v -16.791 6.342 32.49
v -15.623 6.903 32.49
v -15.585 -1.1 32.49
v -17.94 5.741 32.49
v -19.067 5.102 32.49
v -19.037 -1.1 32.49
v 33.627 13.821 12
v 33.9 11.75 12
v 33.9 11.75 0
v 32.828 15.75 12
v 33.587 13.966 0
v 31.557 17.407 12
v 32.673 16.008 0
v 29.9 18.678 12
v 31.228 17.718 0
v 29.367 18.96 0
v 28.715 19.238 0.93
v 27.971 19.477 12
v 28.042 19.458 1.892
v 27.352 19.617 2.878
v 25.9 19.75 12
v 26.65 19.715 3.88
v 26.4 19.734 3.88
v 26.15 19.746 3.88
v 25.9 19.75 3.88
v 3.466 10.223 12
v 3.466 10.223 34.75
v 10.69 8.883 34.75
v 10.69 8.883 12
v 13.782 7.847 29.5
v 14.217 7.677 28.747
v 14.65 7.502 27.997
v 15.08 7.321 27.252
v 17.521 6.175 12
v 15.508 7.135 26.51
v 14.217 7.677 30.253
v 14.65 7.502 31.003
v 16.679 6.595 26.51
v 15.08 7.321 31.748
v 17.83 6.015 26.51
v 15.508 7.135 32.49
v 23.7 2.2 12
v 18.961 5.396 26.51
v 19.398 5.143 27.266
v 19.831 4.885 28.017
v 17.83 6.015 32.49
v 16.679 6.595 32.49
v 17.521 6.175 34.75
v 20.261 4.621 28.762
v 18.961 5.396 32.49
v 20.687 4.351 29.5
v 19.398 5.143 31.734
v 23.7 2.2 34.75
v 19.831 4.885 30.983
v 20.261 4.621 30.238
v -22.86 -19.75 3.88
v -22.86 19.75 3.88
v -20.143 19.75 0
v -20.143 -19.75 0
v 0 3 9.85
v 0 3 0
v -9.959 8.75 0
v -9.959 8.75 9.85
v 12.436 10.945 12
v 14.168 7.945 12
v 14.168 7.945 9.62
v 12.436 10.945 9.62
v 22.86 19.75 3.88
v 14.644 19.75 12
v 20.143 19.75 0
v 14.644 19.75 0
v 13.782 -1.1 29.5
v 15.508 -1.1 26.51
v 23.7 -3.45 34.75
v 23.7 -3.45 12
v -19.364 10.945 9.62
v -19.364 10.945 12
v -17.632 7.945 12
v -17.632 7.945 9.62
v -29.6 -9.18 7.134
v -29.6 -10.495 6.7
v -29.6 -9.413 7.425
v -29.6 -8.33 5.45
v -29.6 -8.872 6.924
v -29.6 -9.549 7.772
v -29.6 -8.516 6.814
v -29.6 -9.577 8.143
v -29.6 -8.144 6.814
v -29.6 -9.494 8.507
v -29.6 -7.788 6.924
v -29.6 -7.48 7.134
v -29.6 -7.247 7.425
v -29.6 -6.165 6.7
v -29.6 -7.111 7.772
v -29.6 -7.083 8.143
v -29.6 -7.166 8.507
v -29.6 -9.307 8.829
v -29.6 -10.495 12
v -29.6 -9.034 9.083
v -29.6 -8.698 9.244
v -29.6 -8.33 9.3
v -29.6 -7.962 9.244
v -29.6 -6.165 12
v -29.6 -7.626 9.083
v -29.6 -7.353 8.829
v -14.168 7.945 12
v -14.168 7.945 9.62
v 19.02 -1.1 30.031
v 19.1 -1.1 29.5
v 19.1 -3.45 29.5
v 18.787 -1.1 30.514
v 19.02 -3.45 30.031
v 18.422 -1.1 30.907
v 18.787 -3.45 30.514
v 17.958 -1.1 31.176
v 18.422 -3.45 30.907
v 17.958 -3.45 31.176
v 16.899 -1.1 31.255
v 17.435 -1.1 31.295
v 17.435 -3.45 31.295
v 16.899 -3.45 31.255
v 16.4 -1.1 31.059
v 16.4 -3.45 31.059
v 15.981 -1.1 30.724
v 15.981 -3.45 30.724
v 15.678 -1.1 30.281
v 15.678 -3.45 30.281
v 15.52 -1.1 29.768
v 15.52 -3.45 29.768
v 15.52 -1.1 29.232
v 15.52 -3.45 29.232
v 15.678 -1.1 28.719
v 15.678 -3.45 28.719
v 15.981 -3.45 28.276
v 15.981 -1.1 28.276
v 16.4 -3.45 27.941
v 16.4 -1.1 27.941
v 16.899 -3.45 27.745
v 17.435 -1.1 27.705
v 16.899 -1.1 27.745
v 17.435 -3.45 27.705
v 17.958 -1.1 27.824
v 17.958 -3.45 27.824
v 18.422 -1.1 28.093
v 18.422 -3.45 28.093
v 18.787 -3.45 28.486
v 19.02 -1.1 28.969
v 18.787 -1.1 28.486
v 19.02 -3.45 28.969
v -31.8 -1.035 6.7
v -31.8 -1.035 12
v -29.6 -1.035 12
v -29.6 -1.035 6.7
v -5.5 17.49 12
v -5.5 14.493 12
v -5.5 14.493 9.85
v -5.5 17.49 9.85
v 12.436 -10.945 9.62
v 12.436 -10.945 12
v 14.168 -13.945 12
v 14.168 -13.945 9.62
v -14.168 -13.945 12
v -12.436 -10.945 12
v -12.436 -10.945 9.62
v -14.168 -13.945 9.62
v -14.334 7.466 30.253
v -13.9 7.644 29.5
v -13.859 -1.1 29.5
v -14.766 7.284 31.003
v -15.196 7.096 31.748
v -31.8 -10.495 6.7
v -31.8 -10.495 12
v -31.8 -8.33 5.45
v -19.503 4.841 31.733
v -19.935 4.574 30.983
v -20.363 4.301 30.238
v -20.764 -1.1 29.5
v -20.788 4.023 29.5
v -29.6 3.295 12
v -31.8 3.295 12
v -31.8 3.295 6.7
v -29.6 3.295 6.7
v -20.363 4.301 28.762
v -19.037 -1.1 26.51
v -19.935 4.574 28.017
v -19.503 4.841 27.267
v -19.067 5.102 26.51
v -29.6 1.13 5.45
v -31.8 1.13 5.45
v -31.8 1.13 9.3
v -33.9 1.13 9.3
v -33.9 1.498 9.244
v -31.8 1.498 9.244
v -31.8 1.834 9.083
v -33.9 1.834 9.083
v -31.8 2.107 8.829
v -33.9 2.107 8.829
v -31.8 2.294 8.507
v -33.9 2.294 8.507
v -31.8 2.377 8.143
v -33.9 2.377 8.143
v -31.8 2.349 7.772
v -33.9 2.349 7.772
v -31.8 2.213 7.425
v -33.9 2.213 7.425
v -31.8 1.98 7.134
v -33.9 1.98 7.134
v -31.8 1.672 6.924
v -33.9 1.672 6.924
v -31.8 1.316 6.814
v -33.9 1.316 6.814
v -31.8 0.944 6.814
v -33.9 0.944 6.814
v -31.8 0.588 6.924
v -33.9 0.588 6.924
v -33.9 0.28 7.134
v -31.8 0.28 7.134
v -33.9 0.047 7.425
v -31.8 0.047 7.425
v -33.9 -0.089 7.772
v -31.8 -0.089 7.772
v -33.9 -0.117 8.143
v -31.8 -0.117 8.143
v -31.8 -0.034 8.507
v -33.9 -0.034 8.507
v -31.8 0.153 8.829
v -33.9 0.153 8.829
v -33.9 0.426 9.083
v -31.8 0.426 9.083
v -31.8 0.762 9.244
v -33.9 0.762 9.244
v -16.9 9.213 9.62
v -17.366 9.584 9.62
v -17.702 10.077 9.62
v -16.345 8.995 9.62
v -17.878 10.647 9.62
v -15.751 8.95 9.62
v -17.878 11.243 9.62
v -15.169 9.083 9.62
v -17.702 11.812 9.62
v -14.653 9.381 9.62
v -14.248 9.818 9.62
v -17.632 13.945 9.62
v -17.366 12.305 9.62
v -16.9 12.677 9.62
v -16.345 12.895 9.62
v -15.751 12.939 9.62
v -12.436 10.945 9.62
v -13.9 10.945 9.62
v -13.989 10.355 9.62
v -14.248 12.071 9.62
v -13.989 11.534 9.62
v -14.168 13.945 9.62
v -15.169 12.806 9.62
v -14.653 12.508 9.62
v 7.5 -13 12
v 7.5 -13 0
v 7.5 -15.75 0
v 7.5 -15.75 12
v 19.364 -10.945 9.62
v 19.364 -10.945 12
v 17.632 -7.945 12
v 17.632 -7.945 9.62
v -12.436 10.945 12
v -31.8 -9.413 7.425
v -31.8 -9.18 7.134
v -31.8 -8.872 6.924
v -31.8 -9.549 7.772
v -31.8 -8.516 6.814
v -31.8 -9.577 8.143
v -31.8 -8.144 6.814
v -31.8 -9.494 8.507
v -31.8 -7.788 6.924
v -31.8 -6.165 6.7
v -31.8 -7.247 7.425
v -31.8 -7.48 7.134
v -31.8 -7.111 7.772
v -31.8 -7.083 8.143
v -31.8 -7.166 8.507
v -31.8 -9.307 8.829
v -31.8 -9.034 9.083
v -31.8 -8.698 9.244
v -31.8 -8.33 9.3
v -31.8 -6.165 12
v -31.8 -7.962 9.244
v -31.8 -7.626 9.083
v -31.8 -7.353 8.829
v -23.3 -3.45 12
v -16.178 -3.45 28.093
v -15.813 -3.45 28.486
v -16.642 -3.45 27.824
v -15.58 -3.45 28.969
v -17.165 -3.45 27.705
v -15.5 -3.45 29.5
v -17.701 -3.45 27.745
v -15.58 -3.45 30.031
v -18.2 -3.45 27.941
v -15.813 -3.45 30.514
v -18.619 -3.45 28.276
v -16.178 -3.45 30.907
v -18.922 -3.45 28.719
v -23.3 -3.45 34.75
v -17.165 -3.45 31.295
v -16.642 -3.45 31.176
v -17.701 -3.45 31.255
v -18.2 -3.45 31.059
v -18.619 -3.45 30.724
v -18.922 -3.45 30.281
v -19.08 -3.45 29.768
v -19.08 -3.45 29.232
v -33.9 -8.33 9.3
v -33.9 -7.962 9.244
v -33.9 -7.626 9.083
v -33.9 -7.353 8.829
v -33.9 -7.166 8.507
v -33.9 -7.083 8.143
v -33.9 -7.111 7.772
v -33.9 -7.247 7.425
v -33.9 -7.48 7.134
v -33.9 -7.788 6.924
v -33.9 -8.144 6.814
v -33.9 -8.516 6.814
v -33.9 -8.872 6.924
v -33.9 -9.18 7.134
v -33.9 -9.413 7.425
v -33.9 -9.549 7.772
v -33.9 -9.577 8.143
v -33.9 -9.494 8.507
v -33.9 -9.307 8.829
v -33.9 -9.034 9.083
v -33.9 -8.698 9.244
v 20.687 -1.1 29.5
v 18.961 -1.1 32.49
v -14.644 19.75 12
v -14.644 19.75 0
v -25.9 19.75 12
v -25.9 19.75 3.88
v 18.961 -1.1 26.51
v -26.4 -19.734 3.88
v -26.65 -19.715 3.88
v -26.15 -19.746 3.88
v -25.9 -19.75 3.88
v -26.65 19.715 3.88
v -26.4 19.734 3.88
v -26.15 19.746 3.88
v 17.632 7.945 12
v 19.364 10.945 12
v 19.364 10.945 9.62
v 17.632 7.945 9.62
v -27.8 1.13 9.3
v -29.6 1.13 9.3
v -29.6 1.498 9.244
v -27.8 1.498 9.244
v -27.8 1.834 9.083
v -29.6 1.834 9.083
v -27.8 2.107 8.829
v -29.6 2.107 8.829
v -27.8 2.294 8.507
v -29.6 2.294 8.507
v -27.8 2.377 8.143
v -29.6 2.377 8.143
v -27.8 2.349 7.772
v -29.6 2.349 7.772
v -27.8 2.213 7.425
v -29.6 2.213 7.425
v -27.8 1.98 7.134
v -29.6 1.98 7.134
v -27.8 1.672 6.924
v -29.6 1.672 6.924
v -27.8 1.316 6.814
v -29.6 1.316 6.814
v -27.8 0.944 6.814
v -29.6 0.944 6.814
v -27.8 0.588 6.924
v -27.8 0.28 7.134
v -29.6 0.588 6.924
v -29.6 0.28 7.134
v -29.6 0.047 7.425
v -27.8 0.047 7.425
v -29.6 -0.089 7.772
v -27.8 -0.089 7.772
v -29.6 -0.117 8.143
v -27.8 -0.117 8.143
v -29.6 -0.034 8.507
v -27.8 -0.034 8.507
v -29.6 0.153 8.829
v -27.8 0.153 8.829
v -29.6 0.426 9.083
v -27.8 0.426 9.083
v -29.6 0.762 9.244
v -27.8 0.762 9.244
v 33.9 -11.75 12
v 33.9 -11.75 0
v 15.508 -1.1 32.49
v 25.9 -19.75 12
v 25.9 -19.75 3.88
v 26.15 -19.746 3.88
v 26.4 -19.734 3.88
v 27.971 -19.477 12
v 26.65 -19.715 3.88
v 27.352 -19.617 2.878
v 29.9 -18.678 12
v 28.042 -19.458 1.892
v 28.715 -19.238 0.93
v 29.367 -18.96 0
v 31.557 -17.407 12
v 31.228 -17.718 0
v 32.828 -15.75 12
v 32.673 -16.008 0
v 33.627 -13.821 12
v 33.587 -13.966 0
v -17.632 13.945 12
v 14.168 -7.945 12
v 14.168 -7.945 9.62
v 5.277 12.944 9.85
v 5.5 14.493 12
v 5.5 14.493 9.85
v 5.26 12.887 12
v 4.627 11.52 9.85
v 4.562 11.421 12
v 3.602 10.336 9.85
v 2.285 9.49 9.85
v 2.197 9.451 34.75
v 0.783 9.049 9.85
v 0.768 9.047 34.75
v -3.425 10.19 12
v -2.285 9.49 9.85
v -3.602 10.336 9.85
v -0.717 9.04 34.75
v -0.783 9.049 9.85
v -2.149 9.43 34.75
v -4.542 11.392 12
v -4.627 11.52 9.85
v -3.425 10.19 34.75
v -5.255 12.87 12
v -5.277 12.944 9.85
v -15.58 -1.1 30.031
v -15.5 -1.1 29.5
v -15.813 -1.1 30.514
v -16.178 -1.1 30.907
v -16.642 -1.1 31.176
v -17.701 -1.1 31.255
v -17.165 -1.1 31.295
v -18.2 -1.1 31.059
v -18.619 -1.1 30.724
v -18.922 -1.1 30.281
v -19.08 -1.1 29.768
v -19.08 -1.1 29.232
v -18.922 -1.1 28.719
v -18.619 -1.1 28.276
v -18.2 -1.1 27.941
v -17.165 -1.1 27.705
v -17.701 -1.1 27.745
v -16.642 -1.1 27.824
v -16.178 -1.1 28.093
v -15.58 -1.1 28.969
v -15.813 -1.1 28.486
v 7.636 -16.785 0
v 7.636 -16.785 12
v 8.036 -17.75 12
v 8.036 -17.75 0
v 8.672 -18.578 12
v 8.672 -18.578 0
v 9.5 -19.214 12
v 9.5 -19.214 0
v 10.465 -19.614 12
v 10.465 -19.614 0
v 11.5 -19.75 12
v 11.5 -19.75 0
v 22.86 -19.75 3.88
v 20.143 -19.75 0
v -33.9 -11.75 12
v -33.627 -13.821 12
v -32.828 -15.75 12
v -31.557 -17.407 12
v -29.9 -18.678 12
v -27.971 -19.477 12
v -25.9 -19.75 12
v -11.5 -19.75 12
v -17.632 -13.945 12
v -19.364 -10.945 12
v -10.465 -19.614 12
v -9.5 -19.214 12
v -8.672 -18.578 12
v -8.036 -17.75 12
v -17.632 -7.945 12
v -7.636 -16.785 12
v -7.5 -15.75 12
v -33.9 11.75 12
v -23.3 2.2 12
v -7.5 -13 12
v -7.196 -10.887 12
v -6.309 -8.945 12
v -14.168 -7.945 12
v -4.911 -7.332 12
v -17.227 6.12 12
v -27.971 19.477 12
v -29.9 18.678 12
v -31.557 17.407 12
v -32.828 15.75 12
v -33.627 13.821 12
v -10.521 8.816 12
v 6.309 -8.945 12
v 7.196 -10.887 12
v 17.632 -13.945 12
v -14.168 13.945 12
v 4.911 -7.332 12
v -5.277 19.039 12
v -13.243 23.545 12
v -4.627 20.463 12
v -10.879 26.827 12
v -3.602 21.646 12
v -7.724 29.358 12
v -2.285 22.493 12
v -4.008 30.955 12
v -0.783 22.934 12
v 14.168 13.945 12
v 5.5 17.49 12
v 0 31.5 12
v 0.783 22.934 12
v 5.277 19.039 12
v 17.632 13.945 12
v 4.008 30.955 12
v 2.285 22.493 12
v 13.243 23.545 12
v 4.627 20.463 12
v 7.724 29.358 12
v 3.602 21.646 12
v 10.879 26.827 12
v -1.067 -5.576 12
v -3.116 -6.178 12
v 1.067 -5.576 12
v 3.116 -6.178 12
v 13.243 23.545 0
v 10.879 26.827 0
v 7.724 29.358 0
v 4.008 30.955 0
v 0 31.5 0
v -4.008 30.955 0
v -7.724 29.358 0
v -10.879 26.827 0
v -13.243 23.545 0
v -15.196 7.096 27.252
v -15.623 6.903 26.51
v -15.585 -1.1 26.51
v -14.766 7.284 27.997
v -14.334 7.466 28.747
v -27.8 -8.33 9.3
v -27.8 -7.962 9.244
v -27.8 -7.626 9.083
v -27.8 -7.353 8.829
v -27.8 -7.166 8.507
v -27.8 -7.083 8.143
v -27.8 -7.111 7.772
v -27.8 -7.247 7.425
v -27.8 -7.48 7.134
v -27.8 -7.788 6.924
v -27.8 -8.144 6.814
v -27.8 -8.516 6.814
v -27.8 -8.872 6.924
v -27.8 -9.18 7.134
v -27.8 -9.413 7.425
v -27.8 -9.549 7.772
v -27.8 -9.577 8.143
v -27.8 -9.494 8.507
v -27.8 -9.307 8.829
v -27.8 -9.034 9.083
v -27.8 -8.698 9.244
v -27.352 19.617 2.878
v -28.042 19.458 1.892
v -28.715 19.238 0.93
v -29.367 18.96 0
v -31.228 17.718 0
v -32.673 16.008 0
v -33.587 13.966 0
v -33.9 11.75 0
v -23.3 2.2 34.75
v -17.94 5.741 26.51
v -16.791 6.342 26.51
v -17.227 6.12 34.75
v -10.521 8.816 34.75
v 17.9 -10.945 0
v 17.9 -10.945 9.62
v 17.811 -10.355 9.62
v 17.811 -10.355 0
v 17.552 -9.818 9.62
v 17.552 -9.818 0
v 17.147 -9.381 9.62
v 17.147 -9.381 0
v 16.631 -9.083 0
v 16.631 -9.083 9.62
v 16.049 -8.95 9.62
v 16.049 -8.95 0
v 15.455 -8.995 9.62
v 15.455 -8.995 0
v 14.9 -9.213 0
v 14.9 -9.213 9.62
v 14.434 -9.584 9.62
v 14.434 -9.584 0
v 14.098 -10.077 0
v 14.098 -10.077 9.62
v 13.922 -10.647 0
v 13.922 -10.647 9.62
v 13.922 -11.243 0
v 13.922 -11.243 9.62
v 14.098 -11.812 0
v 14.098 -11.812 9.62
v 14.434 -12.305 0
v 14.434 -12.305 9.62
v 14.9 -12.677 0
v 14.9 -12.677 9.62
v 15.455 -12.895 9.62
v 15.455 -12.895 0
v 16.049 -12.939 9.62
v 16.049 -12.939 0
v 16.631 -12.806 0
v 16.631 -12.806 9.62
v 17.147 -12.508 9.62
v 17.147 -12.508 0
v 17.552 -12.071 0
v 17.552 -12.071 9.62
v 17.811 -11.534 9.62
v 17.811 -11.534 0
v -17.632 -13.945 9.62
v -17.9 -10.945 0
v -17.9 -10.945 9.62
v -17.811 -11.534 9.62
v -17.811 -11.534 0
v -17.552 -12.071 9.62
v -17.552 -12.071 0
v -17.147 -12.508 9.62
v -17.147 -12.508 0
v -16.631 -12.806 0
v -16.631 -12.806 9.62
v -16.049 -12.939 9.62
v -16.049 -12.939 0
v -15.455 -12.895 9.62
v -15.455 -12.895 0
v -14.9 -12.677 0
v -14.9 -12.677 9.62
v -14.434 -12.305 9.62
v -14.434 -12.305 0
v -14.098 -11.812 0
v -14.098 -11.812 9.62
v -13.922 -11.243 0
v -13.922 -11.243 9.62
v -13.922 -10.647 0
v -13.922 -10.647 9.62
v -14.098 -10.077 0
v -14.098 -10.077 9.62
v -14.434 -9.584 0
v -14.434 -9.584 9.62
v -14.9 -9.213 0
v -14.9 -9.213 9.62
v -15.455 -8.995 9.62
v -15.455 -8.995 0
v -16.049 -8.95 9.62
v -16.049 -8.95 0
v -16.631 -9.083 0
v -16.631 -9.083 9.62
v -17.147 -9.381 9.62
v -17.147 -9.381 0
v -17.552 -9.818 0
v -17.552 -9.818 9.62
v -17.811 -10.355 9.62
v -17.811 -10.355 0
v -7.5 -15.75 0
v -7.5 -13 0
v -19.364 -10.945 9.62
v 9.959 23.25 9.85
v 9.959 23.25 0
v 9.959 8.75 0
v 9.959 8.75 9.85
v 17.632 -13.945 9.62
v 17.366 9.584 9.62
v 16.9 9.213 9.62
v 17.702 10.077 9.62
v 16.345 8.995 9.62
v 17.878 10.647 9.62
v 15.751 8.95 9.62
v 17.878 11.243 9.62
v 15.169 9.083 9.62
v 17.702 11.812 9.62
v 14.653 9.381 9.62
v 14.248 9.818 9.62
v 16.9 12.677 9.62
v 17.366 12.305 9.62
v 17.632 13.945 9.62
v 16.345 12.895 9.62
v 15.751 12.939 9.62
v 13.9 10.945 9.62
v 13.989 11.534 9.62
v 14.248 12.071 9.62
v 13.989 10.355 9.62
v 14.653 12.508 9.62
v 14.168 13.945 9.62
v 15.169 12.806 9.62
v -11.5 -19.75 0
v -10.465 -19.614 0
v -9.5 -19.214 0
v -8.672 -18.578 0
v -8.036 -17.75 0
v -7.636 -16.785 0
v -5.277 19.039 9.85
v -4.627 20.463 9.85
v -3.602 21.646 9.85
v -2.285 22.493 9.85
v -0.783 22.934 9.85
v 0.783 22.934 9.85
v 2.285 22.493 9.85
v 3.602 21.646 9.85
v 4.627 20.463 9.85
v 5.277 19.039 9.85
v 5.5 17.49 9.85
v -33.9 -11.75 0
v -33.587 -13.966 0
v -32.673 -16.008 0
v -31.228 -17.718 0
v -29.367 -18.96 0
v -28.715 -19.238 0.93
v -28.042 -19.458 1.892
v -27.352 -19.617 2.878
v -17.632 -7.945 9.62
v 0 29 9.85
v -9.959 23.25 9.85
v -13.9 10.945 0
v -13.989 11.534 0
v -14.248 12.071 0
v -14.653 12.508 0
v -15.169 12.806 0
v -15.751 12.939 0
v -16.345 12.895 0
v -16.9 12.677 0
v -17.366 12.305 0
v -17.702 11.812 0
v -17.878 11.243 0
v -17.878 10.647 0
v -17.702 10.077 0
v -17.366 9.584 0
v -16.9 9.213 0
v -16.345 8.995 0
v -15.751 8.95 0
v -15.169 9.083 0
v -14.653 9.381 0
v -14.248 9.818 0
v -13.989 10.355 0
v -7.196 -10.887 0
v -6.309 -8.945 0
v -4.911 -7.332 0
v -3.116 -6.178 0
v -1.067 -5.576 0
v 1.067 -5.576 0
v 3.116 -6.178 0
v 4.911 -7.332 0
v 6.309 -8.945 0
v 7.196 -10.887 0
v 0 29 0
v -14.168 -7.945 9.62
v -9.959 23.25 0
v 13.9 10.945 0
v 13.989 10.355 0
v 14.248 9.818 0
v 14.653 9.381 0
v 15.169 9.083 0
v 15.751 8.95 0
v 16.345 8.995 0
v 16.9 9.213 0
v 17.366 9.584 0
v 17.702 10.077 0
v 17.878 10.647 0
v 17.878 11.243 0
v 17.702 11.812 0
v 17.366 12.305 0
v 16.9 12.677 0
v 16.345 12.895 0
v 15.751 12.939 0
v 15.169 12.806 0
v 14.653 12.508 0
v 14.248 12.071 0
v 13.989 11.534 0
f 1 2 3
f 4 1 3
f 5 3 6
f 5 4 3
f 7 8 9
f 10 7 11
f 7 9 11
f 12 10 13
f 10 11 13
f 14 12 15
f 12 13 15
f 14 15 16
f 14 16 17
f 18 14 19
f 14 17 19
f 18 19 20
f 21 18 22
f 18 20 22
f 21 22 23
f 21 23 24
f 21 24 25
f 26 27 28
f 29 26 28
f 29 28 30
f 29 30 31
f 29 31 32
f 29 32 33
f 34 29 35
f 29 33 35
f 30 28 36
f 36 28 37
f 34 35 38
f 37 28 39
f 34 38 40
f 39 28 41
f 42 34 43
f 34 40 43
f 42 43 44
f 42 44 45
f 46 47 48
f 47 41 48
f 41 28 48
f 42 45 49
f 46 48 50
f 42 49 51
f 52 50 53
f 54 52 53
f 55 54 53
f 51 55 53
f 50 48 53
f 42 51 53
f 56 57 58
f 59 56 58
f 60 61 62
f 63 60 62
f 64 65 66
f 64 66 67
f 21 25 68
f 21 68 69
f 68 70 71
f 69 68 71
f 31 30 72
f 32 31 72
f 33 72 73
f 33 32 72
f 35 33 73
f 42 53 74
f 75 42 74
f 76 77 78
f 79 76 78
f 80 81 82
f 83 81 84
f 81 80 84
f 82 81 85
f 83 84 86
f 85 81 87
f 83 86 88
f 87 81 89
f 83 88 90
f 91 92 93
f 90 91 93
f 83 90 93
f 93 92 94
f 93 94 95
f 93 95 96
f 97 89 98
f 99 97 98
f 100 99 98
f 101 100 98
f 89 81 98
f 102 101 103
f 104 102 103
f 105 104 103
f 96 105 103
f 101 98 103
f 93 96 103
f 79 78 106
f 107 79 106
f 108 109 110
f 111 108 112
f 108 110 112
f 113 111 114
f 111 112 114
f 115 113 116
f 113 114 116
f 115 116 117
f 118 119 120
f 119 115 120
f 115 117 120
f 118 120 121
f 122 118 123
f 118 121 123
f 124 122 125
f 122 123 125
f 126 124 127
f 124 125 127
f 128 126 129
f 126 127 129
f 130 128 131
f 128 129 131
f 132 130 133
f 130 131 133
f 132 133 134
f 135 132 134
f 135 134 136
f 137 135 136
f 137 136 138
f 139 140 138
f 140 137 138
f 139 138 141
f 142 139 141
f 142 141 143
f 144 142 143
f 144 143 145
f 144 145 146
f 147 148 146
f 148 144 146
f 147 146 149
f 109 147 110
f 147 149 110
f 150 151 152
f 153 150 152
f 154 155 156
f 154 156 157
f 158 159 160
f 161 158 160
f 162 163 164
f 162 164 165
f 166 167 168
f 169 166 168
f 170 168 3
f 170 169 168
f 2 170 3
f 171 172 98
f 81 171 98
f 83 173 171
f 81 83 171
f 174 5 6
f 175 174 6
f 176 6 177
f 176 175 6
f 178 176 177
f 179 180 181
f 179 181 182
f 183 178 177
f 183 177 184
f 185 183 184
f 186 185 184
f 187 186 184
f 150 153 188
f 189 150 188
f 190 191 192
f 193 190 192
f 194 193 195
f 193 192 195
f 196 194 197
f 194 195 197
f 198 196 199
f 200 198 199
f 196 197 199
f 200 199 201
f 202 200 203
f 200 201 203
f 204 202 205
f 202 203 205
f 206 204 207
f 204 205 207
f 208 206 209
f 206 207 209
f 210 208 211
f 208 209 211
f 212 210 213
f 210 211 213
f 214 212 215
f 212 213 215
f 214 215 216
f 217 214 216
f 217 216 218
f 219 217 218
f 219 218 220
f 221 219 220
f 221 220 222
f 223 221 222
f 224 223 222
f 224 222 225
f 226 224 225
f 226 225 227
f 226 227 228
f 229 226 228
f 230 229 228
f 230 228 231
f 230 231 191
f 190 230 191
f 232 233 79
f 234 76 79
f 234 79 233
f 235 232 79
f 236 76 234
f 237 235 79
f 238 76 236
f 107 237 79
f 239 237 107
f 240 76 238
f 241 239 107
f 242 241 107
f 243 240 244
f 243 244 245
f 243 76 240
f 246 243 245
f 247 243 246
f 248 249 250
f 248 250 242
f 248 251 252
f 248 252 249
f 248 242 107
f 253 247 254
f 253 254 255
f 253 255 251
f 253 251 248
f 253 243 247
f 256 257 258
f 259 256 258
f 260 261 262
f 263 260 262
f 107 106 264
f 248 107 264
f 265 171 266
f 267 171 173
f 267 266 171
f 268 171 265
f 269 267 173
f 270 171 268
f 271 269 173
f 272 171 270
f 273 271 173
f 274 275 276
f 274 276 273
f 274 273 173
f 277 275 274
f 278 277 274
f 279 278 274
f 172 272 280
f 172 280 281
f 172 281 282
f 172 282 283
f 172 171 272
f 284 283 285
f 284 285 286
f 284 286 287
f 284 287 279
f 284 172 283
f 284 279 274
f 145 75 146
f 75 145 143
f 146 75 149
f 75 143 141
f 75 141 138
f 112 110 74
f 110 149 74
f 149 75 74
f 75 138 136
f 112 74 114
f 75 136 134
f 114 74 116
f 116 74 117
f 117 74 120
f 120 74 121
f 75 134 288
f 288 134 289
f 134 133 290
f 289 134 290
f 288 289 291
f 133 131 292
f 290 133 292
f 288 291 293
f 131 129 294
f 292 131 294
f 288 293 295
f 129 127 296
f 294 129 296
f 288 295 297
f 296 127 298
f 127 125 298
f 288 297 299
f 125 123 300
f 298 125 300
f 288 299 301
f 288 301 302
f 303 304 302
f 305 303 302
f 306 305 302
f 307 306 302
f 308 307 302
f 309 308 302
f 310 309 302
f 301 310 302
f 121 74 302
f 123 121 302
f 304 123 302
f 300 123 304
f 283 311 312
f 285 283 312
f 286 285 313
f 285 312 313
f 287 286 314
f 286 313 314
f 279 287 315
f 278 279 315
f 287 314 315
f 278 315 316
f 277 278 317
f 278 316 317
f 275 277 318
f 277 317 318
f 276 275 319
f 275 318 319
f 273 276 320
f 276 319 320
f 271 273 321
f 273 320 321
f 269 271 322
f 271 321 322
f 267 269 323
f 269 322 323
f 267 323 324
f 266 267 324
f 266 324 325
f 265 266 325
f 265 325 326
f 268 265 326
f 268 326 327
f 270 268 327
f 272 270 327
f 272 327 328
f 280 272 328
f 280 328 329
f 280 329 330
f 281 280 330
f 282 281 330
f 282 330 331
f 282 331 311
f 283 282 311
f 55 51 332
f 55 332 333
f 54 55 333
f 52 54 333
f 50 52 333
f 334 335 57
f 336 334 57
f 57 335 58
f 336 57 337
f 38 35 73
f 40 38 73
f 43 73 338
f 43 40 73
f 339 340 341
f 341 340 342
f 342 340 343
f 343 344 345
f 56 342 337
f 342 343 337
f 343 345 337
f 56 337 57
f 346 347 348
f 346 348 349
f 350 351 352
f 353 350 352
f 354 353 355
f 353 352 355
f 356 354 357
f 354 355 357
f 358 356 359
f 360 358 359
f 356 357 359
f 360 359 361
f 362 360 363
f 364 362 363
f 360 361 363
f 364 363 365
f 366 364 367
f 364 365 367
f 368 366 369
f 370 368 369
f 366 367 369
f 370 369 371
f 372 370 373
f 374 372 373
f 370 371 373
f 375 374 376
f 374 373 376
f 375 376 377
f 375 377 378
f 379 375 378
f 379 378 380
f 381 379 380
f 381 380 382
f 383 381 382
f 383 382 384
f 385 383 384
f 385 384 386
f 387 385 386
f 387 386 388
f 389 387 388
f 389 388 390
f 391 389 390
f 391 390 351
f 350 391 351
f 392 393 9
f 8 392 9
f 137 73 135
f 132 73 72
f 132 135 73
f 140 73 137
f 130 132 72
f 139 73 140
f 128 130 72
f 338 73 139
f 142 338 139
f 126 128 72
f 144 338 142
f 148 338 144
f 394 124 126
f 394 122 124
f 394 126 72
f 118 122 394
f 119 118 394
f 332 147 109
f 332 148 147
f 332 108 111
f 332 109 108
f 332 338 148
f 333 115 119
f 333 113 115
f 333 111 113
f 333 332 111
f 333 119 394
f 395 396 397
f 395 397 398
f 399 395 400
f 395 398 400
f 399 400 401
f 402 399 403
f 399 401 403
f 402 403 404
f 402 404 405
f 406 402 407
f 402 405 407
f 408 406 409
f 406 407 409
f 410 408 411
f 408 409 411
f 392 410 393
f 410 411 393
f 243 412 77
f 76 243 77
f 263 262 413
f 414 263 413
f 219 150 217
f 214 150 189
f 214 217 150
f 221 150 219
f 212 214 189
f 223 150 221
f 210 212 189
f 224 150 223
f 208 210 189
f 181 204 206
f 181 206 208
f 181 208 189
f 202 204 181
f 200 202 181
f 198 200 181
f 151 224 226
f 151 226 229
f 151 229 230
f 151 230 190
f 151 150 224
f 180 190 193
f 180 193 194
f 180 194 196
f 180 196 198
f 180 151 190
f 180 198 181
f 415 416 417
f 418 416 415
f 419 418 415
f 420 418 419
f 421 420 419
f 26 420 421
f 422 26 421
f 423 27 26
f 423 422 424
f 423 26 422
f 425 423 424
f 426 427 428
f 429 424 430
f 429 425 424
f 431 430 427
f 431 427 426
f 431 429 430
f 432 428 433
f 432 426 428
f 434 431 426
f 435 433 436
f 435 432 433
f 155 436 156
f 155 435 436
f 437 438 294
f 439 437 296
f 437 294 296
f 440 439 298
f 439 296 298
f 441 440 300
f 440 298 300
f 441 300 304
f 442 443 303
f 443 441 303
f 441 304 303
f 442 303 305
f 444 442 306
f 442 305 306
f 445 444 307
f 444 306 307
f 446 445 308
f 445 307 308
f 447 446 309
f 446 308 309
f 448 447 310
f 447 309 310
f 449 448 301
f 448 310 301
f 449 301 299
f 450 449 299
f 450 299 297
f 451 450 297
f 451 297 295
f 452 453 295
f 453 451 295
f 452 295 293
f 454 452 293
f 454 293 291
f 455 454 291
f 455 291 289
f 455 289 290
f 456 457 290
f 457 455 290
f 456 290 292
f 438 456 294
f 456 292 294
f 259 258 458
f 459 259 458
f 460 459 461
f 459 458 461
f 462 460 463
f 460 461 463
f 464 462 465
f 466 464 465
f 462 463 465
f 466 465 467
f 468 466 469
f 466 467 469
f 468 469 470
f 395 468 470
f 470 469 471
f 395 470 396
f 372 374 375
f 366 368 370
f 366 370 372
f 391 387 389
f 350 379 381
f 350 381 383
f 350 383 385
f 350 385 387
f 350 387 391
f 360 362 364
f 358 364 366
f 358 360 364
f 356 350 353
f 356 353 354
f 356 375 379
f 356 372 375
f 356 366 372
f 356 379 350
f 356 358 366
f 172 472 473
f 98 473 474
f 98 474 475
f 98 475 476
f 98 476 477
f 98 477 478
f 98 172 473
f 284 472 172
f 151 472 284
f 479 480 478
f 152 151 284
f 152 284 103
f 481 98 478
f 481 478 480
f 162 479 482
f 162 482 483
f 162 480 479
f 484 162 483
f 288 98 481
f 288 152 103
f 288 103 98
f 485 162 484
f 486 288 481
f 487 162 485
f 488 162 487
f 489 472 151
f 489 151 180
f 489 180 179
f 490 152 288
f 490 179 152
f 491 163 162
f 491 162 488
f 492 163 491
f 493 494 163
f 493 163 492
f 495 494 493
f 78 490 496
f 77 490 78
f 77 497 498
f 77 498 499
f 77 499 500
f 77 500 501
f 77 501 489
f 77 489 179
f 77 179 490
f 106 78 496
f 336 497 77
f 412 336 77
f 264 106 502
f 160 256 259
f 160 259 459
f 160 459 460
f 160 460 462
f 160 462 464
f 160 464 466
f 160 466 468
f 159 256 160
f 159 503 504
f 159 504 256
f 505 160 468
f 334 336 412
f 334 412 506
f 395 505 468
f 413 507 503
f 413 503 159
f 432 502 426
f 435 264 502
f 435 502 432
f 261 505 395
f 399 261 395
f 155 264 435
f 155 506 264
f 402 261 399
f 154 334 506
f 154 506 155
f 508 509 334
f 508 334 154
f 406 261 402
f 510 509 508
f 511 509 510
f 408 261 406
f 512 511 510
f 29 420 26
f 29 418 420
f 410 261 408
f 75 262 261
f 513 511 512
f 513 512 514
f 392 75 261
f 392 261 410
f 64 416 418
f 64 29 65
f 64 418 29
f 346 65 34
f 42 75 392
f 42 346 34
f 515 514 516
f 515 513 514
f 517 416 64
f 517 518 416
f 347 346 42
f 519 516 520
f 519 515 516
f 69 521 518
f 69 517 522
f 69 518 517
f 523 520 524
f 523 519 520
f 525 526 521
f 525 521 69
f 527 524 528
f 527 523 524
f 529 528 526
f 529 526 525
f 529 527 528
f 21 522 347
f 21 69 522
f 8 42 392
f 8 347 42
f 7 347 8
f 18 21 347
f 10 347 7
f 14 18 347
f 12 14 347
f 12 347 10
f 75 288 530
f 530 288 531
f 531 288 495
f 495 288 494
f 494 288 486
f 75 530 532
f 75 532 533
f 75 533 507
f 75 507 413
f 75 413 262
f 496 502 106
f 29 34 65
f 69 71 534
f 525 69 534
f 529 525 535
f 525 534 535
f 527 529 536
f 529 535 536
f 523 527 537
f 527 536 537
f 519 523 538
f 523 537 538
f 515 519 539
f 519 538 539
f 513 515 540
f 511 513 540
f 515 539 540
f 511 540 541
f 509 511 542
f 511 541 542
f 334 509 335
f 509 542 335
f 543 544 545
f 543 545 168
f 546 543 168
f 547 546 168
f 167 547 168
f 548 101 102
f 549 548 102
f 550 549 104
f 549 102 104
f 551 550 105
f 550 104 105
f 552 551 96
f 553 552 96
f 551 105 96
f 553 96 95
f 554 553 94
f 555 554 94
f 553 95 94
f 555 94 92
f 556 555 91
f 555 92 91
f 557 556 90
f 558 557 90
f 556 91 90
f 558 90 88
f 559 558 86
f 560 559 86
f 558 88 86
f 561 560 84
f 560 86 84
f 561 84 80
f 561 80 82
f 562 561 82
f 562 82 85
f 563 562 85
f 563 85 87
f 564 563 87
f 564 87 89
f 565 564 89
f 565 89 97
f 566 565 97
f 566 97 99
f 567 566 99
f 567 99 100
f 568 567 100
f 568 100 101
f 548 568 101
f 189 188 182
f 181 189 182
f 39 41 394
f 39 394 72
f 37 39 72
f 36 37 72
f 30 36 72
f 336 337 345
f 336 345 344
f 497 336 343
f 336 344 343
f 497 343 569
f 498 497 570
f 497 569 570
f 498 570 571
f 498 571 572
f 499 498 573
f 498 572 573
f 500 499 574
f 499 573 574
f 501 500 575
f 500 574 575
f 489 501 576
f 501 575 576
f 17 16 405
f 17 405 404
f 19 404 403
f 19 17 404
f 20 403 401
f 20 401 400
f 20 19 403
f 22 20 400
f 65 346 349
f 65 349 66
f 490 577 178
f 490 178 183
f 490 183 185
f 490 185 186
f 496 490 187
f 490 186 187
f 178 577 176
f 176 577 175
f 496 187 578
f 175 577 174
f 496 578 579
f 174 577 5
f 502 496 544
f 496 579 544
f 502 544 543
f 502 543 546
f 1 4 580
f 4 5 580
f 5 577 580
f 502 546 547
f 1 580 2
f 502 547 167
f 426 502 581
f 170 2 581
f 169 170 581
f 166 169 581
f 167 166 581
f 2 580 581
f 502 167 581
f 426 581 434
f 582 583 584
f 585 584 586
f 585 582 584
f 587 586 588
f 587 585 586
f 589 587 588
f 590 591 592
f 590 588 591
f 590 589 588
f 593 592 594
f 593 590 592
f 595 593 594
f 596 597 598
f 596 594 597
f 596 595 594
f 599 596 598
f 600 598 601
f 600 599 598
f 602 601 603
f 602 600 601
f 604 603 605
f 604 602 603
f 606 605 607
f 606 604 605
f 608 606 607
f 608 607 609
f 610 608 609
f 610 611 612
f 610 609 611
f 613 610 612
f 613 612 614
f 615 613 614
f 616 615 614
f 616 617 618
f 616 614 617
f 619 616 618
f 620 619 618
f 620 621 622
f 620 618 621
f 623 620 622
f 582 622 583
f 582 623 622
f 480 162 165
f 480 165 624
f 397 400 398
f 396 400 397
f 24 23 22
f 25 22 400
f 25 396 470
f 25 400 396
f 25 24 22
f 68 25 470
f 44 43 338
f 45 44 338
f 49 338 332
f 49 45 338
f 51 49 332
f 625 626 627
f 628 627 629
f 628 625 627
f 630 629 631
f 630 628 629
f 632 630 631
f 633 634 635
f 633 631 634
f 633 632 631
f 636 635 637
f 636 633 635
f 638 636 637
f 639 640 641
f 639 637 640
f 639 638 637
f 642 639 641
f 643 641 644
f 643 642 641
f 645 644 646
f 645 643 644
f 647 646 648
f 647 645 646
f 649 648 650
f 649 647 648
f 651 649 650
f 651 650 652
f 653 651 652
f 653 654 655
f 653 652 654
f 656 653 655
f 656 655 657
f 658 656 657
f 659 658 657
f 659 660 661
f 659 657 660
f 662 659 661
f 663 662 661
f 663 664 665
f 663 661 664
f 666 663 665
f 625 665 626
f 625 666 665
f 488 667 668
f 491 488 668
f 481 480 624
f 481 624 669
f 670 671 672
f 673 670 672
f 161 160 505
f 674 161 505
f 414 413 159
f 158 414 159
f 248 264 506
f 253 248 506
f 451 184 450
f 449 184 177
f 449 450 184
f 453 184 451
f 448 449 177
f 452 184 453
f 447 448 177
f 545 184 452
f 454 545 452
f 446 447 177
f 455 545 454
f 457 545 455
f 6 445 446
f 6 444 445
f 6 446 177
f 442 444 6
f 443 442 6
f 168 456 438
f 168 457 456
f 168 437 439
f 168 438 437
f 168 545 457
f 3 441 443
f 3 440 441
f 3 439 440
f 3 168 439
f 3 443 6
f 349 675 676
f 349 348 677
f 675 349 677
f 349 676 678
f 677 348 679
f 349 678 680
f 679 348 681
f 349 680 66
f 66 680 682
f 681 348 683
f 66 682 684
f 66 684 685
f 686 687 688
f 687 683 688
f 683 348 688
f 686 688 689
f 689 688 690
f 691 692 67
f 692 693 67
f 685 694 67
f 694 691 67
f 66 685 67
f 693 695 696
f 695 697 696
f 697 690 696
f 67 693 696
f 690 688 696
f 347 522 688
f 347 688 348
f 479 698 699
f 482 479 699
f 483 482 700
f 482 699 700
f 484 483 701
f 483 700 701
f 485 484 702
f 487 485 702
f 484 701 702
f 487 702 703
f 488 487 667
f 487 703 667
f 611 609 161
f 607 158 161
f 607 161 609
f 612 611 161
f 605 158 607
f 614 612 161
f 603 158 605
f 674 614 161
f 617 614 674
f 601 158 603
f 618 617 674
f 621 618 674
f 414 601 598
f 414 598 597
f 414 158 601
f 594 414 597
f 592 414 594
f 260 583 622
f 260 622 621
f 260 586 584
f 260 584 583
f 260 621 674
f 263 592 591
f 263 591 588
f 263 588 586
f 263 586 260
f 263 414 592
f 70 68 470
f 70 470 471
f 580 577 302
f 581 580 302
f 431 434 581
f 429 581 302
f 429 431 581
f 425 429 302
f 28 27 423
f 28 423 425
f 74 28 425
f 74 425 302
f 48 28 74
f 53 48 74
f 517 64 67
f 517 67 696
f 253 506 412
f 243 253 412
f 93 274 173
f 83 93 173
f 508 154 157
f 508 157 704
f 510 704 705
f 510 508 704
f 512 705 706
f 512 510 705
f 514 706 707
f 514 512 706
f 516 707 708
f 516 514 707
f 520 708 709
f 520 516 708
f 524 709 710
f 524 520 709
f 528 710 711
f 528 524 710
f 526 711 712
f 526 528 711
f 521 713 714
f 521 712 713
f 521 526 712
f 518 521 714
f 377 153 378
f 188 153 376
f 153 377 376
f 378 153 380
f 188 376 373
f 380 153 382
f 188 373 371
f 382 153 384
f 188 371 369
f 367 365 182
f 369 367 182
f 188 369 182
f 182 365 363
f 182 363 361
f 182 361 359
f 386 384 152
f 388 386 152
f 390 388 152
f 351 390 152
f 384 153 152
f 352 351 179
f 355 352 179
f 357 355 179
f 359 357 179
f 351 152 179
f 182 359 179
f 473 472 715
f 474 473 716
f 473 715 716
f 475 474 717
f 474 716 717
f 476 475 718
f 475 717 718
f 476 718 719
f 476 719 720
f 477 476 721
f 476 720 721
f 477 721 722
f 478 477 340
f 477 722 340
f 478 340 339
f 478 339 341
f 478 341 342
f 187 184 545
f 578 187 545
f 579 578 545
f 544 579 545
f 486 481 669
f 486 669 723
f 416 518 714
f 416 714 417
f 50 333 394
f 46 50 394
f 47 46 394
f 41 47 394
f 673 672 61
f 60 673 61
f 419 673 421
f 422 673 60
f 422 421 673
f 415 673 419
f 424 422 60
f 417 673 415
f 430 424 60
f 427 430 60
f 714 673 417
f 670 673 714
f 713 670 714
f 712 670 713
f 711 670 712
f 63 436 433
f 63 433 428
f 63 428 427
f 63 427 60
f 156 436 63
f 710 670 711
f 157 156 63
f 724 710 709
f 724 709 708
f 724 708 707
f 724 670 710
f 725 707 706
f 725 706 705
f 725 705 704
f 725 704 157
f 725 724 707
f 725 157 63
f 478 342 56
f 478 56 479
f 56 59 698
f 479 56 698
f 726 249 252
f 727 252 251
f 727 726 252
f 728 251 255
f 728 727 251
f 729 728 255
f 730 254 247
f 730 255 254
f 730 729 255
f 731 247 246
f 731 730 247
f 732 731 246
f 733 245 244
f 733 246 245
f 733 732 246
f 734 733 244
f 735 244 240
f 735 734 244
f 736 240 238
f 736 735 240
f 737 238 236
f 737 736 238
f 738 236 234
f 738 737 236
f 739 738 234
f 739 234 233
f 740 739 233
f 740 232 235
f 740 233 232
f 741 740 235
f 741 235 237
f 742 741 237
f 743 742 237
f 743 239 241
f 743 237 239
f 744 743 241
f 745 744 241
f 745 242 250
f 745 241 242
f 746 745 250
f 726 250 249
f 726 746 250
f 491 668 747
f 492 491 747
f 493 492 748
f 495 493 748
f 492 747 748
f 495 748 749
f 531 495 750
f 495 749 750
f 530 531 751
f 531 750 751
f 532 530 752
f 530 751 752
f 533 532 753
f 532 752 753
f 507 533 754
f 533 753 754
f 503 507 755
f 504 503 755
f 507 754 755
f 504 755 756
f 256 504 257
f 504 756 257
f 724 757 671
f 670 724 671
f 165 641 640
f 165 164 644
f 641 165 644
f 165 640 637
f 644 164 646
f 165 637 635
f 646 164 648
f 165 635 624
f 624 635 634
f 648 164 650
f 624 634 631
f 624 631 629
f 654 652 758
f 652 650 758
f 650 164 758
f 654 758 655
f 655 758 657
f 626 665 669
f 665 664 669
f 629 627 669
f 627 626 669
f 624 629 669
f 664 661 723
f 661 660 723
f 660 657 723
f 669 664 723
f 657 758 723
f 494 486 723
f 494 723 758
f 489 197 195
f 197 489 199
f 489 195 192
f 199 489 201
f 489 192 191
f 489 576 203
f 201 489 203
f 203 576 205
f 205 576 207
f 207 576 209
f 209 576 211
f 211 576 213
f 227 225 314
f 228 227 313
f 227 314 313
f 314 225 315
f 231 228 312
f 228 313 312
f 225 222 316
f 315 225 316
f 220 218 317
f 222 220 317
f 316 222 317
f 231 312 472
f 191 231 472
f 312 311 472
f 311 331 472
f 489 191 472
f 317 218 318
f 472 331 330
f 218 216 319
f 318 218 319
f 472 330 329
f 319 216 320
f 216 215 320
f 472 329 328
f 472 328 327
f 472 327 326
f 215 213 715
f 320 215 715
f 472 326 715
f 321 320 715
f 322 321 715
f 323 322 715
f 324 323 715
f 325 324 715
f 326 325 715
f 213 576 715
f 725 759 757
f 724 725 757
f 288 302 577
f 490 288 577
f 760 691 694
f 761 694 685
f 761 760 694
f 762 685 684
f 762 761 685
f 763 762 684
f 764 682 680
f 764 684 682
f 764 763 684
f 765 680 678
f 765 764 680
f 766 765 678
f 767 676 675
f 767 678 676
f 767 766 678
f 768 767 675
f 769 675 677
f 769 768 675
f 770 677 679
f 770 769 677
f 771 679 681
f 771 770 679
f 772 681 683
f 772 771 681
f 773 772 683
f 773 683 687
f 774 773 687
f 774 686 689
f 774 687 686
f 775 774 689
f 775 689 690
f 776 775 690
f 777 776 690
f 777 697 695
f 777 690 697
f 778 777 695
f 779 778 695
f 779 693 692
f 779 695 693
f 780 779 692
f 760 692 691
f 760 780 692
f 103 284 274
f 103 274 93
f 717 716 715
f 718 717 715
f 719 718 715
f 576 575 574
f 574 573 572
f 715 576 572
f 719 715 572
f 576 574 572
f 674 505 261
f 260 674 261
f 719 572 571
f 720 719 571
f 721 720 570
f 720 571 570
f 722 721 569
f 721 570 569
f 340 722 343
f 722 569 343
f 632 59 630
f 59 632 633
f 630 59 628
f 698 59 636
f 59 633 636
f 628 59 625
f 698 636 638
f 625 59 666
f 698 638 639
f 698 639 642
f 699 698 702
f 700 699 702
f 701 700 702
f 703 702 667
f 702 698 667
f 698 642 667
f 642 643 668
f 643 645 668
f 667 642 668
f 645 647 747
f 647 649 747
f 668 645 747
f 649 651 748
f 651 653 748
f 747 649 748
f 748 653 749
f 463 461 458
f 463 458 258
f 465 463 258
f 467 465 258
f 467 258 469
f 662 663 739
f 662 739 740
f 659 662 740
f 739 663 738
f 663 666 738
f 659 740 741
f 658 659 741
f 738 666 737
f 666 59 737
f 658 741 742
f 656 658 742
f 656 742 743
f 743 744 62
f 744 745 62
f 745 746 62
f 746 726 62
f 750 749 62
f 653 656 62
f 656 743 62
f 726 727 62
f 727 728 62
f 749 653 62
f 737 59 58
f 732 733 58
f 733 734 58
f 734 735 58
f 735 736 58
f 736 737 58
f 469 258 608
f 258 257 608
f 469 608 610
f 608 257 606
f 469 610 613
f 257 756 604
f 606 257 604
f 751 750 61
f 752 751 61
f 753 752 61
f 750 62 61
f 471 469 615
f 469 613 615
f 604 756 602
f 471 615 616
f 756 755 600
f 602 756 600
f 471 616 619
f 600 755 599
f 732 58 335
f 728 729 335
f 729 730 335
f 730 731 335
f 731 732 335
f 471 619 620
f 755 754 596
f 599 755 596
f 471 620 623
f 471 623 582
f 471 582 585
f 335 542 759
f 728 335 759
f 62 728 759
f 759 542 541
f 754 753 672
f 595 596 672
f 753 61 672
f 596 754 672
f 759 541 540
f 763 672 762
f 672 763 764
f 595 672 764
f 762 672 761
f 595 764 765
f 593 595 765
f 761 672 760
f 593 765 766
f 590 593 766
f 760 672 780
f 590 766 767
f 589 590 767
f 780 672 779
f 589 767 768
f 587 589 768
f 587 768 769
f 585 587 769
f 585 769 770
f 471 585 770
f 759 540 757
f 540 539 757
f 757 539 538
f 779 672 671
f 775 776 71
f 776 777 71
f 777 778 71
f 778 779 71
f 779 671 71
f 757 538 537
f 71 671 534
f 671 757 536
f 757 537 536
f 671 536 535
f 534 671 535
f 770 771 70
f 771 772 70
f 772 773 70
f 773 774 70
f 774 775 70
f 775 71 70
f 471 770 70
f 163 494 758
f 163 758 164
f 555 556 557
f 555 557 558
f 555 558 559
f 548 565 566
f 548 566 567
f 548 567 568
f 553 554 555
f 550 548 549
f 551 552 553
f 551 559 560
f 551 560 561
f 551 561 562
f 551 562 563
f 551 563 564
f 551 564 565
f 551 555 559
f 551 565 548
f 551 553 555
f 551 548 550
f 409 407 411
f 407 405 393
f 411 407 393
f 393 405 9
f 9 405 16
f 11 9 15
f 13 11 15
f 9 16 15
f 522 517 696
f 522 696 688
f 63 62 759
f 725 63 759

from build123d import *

# Parameters (mm, degrees)
SKETCH1_R               = 2
BOSS_EXTRUDE4_DEPTH     = 34.75
SKETCH5_R               = 2
CUT_EXTRUDE2_DEPTH      = 22.75
CUT_EXTRUDE3_REACH      = 59.871
CUT_EXTRUDE4_DEPTH      = 63.586120666
CUT_EXTRUDE5_REACH      = 61.819
CUT_EXTRUDE5_END_RADIUS = 37.906002519
SKETCH10_R              = 1.8
CUT_EXTRUDE6_REACH      = 59.074
SKETCH11_RX             = 1.8
SKETCH11_RY             = 1.799979565
CUT_EXTRUDE7_REACH      = 59.075
SKETCH11_4_RX           = 1.8
SKETCH11_4_RY           = 1.799979565
CUT_EXTRUDE8_DEPTH      = 9.85
SKETCH15_R              = 2
CUT_EXTRUDE9_DEPTH      = 2.38
SKETCH16_R              = 1.25
CUT_EXTRUDE10_DEPTH     = 6.1
SKETCH17_W              = 2.2
SKETCH17_H              = 4.33
CUT_EXTRUDE11_DEPTH     = 6.55
BOSS_EXTRUDE5_DEPTH     = 2.2
BOSS_EXTRUDE6_DEPTH     = 2.2


with BuildPart() as part:
    # Sketch1 → Boss-Extrude4 (new body)
    with BuildSketch(Plane.XY):
        with BuildLine():
            Line((-25.9, -19.75), (-11.5, -19.75))
            ThreePointArc((-11.5, -19.75), (-8.671572875, -18.578427125), (-7.5, -15.75))
            Line((-7.5, -15.75), (-7.5, -13))
            ThreePointArc((-7.5, -13), (0, -5.5), (7.5, -13))
            Line((7.5, -13), (7.5, -15.75))
            ThreePointArc((7.5, -15.75), (8.671572875, -18.578427125), (11.5, -19.75))
            Line((11.5, -19.75), (25.9, -19.75))
            ThreePointArc((25.9, -19.75), (31.556854249, -17.406854249), (33.9, -11.75))
            Line((33.9, -11.75), (33.9, 11.75))
            ThreePointArc((33.9, 11.75), (31.556854249, 17.406854249), (25.9, 19.75))
            Line((25.9, 19.75), (14.643684646, 19.75))
            ThreePointArc((14.643684646, 19.75), (0, 31.5), (-14.643684646, 19.75))
            Line((-14.643684646, 19.75), (-25.9, 19.75))
            ThreePointArc((-25.9, 19.75), (-31.556854249, 17.406854249), (-33.9, 11.75))
            Line((-33.9, 11.75), (-33.9, -11.75))
            ThreePointArc((-33.9, -11.75), (-31.556854249, -17.406854249), (-25.9, -19.75))
        make_face()
        with Locations((-15.9, 10.944699181)):
            Circle(SKETCH1_R, mode=Mode.SUBTRACT)
        with Locations(Location((-15.9, -10.944699181, 0), (0, 0, 180))):
            Circle(SKETCH1_R, mode=Mode.SUBTRACT)
        with Locations((15.9, -10.944699181)):
            Circle(SKETCH1_R, mode=Mode.SUBTRACT)
        with Locations(Location((15.9, 10.944699181, 0), (0, 0, 180))):
            Circle(SKETCH1_R, mode=Mode.SUBTRACT)
    extrude(amount=BOSS_EXTRUDE4_DEPTH)

    # Sketch5 → Cut-Extrude2 (cut)
    with BuildSketch(Plane.XY.offset(34.75)):
        with BuildLine():
            Line((33.9, -11.75), (33.9, 11.75))
            ThreePointArc((33.9, 11.75), (31.556854249, 17.406854249), (25.9, 19.75))
            Line((25.9, 19.75), (14.643684646, 19.75))
            ThreePointArc((14.643684646, 19.75), (0, 31.5), (-14.643684646, 19.75))
            Line((-14.643684646, 19.75), (-25.9, 19.75))
            ThreePointArc((-25.9, 19.75), (-31.556854249, 17.406854249), (-33.9, 11.75))
            Line((-33.9, 11.75), (-33.9, -11.75))
            ThreePointArc((-33.9, -11.75), (-31.556854249, -17.406854249), (-25.9, -19.75))
            Line((-25.9, -19.75), (-11.5, -19.75))
            ThreePointArc((-11.5, -19.75), (-8.671572875, -18.578427125), (-7.5, -15.75))
            Line((-7.5, -15.75), (-7.5, -13))
            ThreePointArc((-7.5, -13), (0, -5.5), (7.5, -13))
            Line((7.5, -13), (7.5, -15.75))
            ThreePointArc((7.5, -15.75), (8.671572875, -18.578427125), (11.5, -19.75))
            Line((11.5, -19.75), (25.9, -19.75))
            ThreePointArc((25.9, -19.75), (31.556854249, -17.406854249), (33.9, -11.75))
        make_face()
        with Locations((-15.9, 10.944699181)):
            Circle(SKETCH5_R, mode=Mode.SUBTRACT)
        with BuildLine():
            Line((-23.3, -3.45), (-23.3, 2.199999619))
            ThreePointArc((-23.3, 2.199999619), (0.199916465, 10.363760615), (23.699998093, 2.200475068))
            Line((23.699998093, 2.200475068), (23.699998093, -3.45))
            Line((23.699998093, -3.45), (-23.3, -3.45))
        make_face(mode=Mode.SUBTRACT)
    extrude(amount=-CUT_EXTRUDE2_DEPTH, mode=Mode.SUBTRACT)

    # Sketch6 → Cut-Extrude3 (cut, up to next)
    with BuildSketch(Plane.XY.offset(34.75), mode=Mode.PRIVATE) as cut_extrude3_sk1:
        with BuildLine():
            Line((-5.499999046, 14.493093188), (-5.499999046, 17.489830849))
            ThreePointArc((-5.499999046, 17.489830849), (0, 22.989829895), (5.499999046, 17.489830849))
            Line((5.499999046, 17.489830849), (5.499999046, 14.493093188))
            ThreePointArc((5.499999046, 14.493093188), (0, 8.993094142), (-5.499999046, 14.493093188))
        make_face()
    cut_extrude3_tool1 = extrude(cut_extrude3_sk1.sketch, amount=-CUT_EXTRUDE3_REACH, mode=Mode.PRIVATE) & part.part
    add(cut_extrude3_tool1.solids().sort_by_distance((0, 15.991462, 34.75))[0], mode=Mode.SUBTRACT)

    # Sketch9 → Cut-Extrude4 (cut, through all)
    with BuildSketch(Plane(origin=(0, 19.75, 0), x_dir=(1, 0, 0), z_dir=(0, 1, 0))):
        Polygon((-29.366805248, 0), (-26.65, -3.88), (-22.86, -3.88), (-20.143194752, 0), align=None)
        Polygon((22.86, -3.88), (20.143194752, 0), (29.366805248, 0), (26.65, -3.88), align=None)
    extrude(amount=-CUT_EXTRUDE4_DEPTH, mode=Mode.SUBTRACT)

    # Cut-Extrude5: up to this cylinder (the profile starts inside it)
    cut_extrude5_end = Plane(origin=(0.20029992, -27.542241902, 29.5), z_dir=(0, 0, 1)) * Cylinder(CUT_EXTRUDE5_END_RADIUS, 200.450005039, mode=Mode.PRIVATE)
    # Sketch10 → Cut-Extrude5 (cut, up to the surface)
    with BuildSketch(Plane.XZ.offset(3.45), mode=Mode.PRIVATE) as cut_extrude5_sk1:
        with Locations((-17.3, 29.5)):
            Circle(SKETCH10_R)
    cut_extrude5_tool1 = extrude(cut_extrude5_sk1.sketch, amount=-CUT_EXTRUDE5_REACH, mode=Mode.PRIVATE) & cut_extrude5_end
    add(cut_extrude5_tool1.solids().sort_by_distance((-17.3, -3.45, 29.5))[0], mode=Mode.SUBTRACT)
    # Sketch10 → Cut-Extrude5 (cut, up to the surface)
    with BuildSketch(Plane.XZ.offset(3.45), mode=Mode.PRIVATE) as cut_extrude5_sk2:
        with Locations((17.3, 29.5)):
            Circle(SKETCH10_R)
    cut_extrude5_tool2 = extrude(cut_extrude5_sk2.sketch, amount=-CUT_EXTRUDE5_REACH, mode=Mode.PRIVATE) & cut_extrude5_end
    add(cut_extrude5_tool2.solids().sort_by_distance((17.3, -3.45, 29.5))[0], mode=Mode.SUBTRACT)

    # Cut-Extrude6: up to this plane
    cut_extrude6_end = Plane(origin=(0, -1.1, 12), z_dir=(0, 1, 0))
    # Sketch11 → Cut-Extrude6 (cut, up to the surface)
    with BuildSketch(Plane(origin=(-0.04863224, 10.206057531, 0), x_dir=(-0.999988647405363, -0.004764982727443531, 0), z_dir=(0.00476498272744353, -0.9999886474053629, 0)), mode=Mode.PRIVATE) as cut_extrude6_sk1:
        Polygon((13.863688181, -29.5), (15.589965486, -32.49), (19.042520095, -32.49), (20.7687974, -29.5), (19.042520095, -26.51), (15.589965486, -26.51), align=None)
        with Locations(Location((17.316242791, -29.5), (0, 0, -90))):
            Ellipse(SKETCH11_RX, SKETCH11_RY, mode=Mode.SUBTRACT)
    cut_extrude6_tool1 = split(extrude(cut_extrude6_sk1.sketch, amount=CUT_EXTRUDE6_REACH, mode=Mode.PRIVATE), bisect_by=cut_extrude6_end, keep=Keep.BOTH, mode=Mode.PRIVATE)
    add(cut_extrude6_tool1.solids().sort_by_distance((-14.854399, 10.135508, 30.949327))[0], mode=Mode.SUBTRACT)
    # Sketch11 → Cut-Extrude6 (cut, up to the surface)
    with BuildSketch(Plane(origin=(-0.04863224, 10.206057531, 0), x_dir=(-0.999988647405363, -0.004764982727443531, 0), z_dir=(0.00476498272744353, -0.9999886474053629, 0)), mode=Mode.PRIVATE) as cut_extrude6_sk2:
        with Locations(Location((17.316242791, -29.5), (0, 0, -90))):
            Ellipse(SKETCH11_RX, SKETCH11_RY)
    cut_extrude6_tool2 = split(extrude(cut_extrude6_sk2.sketch, amount=CUT_EXTRUDE6_REACH, mode=Mode.PRIVATE), bisect_by=cut_extrude6_end, keep=Keep.BOTH, mode=Mode.PRIVATE)
    add(cut_extrude6_tool2.solids().sort_by_distance((-17.364678, 10.123546, 29.5))[0], mode=Mode.SUBTRACT)

    # Cut-Extrude7: up to this plane
    cut_extrude7_end = Plane(origin=(0, -1.1, 12), z_dir=(0, 1, 0))
    # Sketch11<4> → Cut-Extrude7 (cut, up to the surface)
    with BuildSketch(Plane(origin=(-0.04863224, 10.206057531, 0), x_dir=(-0.999988647405363, -0.004764982727443531, 0), z_dir=(0.00476498272744353, -0.9999886474053629, 0)), mode=Mode.PRIVATE) as cut_extrude7_sk1:
        Polygon((-13.8308098, -29.5), (-15.557087105, -26.51), (-19.009641715, -26.51), (-20.735919019, -29.5), (-19.009641715, -32.49), (-15.557087105, -32.49), align=None)
        with Locations(Location((-17.28336441, -29.5), (0, 0, -90))):
            Ellipse(SKETCH11_4_RX, SKETCH11_4_RY, mode=Mode.SUBTRACT)
    cut_extrude7_tool1 = split(extrude(cut_extrude7_sk1.sketch, amount=CUT_EXTRUDE7_REACH, dir=(0, -1, 0), mode=Mode.PRIVATE), bisect_by=cut_extrude7_end, keep=Keep.BOTH, mode=Mode.PRIVATE)
    add(cut_extrude7_tool1.solids().sort_by_distance((14.724256, 10.276451, 28.050673))[0], mode=Mode.SUBTRACT)
    # Sketch11<4> → Cut-Extrude7 (cut, up to the surface)
    with BuildSketch(Plane(origin=(-0.04863224, 10.206057531, 0), x_dir=(-0.999988647405363, -0.004764982727443531, 0), z_dir=(0.00476498272744353, -0.9999886474053629, 0)), mode=Mode.PRIVATE) as cut_extrude7_sk2:
        with Locations(Location((-17.28336441, -29.5), (0, 0, -90))):
            Ellipse(SKETCH11_4_RX, SKETCH11_4_RY)
    cut_extrude7_tool2 = split(extrude(cut_extrude7_sk2.sketch, amount=CUT_EXTRUDE7_REACH, dir=(0, -1, 0), mode=Mode.PRIVATE), bisect_by=cut_extrude7_end, keep=Keep.BOTH, mode=Mode.PRIVATE)
    add(cut_extrude7_tool2.solids().sort_by_distance((17.234536, 10.288412, 29.5))[0], mode=Mode.SUBTRACT)

    # Sketch14 → Cut-Extrude8 (cut)
    with BuildSketch(Plane(origin=(0, 0, 0), x_dir=(-1, 0, 0), z_dir=(0, 0, -1))):
        Polygon((0, 3), (9.959292144, 8.75), (9.959292144, 23.25), (0, 29), (-9.959292144, 23.25), (-9.959292144, 8.75), align=None)
    extrude(amount=-CUT_EXTRUDE8_DEPTH, mode=Mode.SUBTRACT)

    # Sketch15 → Cut-Extrude9 (cut)
    with BuildSketch(Plane.XY.offset(12)):
        Polygon((-14.167949192, 7.944699181), (-12.435898385, 10.944699181), (-14.167949192, 13.944699181), (-17.632050808, 13.944699181), (-19.364101615, 10.944699181), (-17.632050808, 7.944699181), align=None)
        with Locations((-15.9, 10.944699181)):
            Circle(SKETCH15_R, mode=Mode.SUBTRACT)
        with Locations((-15.9, 10.944699181)):
            Circle(SKETCH15_R)
        Polygon((14.167949192, 13.944699181), (17.632050808, 13.944699181), (19.364101615, 10.944699181), (17.632050808, 7.944699181), (14.167949192, 7.944699181), (12.435898385, 10.944699181), align=None)
        with Locations(Location((15.9, 10.944699181, 0), (0, 0, 180))):
            Circle(SKETCH15_R, mode=Mode.SUBTRACT)
        with Locations(Location((15.9, 10.944699181, 0), (0, 0, 180))):
            Circle(SKETCH15_R)
        Polygon((12.435898385, -10.944699181), (14.167949192, -13.944699181), (17.632050808, -13.944699181), (19.364101615, -10.944699181), (17.632050808, -7.944699181), (14.167949192, -7.944699181), align=None)
        with Locations((15.9, -10.944699181)):
            Circle(SKETCH15_R, mode=Mode.SUBTRACT)
        with Locations((15.9, -10.944699181)):
            Circle(SKETCH15_R)
        Polygon((-17.632050808, -13.944699181), (-19.364101615, -10.944699181), (-17.632050808, -7.944699181), (-14.167949192, -7.944699181), (-12.435898385, -10.944699181), (-14.167949192, -13.944699181), align=None)
        with Locations(Location((-15.9, -10.944699181, 0), (0, 0, 180))):
            Circle(SKETCH15_R, mode=Mode.SUBTRACT)
        with Locations(Location((-15.9, -10.944699181, 0), (0, 0, 180))):
            Circle(SKETCH15_R)
    extrude(amount=-CUT_EXTRUDE9_DEPTH, mode=Mode.SUBTRACT)

    # Sketch16 → Cut-Extrude10 (cut)
    with BuildSketch(Plane.ZY.offset(33.9)):
        with Locations((8.05, 1.13)):
            Circle(SKETCH16_R)
        with Locations((8.05, -8.33)):
            Circle(SKETCH16_R)
    extrude(amount=-CUT_EXTRUDE10_DEPTH, mode=Mode.SUBTRACT)

    # Sketch17 → Cut-Extrude11 (cut)
    with BuildSketch(Plane.XY.offset(12)):
        with Locations((-30.7, 1.13)):
            Rectangle(SKETCH17_W, SKETCH17_H)
        with Locations((-30.7, -8.33)):
            Rectangle(SKETCH17_W, SKETCH17_H)
    extrude(amount=-CUT_EXTRUDE11_DEPTH, mode=Mode.SUBTRACT)

    # Sketch18 → Boss-Extrude5 (add)
    with BuildSketch(Plane.ZY.offset(29.6)):
        Polygon((5.45, 3.295), (5.45, 1.13), (6.699963333, 3.295), align=None)
        Polygon((5.45, -1.035), (6.699963333, -1.035), (5.45, 1.13), align=None)
    extrude(amount=BOSS_EXTRUDE5_DEPTH)

    # Sketch21 → Boss-Extrude6 (add)
    with BuildSketch(Plane(origin=(-31.8, 0, 0), x_dir=(0, 0, -1), z_dir=(1, 0, 0))):
        Polygon((-5.45, -6.165), (-6.699963333, -6.165), (-5.45, -8.33), align=None)
        Polygon((-5.45, -10.495), (-5.45, -8.33), (-6.699963333, -10.495), align=None)
    extrude(amount=BOSS_EXTRUDE6_DEPTH)


solid = part.part
